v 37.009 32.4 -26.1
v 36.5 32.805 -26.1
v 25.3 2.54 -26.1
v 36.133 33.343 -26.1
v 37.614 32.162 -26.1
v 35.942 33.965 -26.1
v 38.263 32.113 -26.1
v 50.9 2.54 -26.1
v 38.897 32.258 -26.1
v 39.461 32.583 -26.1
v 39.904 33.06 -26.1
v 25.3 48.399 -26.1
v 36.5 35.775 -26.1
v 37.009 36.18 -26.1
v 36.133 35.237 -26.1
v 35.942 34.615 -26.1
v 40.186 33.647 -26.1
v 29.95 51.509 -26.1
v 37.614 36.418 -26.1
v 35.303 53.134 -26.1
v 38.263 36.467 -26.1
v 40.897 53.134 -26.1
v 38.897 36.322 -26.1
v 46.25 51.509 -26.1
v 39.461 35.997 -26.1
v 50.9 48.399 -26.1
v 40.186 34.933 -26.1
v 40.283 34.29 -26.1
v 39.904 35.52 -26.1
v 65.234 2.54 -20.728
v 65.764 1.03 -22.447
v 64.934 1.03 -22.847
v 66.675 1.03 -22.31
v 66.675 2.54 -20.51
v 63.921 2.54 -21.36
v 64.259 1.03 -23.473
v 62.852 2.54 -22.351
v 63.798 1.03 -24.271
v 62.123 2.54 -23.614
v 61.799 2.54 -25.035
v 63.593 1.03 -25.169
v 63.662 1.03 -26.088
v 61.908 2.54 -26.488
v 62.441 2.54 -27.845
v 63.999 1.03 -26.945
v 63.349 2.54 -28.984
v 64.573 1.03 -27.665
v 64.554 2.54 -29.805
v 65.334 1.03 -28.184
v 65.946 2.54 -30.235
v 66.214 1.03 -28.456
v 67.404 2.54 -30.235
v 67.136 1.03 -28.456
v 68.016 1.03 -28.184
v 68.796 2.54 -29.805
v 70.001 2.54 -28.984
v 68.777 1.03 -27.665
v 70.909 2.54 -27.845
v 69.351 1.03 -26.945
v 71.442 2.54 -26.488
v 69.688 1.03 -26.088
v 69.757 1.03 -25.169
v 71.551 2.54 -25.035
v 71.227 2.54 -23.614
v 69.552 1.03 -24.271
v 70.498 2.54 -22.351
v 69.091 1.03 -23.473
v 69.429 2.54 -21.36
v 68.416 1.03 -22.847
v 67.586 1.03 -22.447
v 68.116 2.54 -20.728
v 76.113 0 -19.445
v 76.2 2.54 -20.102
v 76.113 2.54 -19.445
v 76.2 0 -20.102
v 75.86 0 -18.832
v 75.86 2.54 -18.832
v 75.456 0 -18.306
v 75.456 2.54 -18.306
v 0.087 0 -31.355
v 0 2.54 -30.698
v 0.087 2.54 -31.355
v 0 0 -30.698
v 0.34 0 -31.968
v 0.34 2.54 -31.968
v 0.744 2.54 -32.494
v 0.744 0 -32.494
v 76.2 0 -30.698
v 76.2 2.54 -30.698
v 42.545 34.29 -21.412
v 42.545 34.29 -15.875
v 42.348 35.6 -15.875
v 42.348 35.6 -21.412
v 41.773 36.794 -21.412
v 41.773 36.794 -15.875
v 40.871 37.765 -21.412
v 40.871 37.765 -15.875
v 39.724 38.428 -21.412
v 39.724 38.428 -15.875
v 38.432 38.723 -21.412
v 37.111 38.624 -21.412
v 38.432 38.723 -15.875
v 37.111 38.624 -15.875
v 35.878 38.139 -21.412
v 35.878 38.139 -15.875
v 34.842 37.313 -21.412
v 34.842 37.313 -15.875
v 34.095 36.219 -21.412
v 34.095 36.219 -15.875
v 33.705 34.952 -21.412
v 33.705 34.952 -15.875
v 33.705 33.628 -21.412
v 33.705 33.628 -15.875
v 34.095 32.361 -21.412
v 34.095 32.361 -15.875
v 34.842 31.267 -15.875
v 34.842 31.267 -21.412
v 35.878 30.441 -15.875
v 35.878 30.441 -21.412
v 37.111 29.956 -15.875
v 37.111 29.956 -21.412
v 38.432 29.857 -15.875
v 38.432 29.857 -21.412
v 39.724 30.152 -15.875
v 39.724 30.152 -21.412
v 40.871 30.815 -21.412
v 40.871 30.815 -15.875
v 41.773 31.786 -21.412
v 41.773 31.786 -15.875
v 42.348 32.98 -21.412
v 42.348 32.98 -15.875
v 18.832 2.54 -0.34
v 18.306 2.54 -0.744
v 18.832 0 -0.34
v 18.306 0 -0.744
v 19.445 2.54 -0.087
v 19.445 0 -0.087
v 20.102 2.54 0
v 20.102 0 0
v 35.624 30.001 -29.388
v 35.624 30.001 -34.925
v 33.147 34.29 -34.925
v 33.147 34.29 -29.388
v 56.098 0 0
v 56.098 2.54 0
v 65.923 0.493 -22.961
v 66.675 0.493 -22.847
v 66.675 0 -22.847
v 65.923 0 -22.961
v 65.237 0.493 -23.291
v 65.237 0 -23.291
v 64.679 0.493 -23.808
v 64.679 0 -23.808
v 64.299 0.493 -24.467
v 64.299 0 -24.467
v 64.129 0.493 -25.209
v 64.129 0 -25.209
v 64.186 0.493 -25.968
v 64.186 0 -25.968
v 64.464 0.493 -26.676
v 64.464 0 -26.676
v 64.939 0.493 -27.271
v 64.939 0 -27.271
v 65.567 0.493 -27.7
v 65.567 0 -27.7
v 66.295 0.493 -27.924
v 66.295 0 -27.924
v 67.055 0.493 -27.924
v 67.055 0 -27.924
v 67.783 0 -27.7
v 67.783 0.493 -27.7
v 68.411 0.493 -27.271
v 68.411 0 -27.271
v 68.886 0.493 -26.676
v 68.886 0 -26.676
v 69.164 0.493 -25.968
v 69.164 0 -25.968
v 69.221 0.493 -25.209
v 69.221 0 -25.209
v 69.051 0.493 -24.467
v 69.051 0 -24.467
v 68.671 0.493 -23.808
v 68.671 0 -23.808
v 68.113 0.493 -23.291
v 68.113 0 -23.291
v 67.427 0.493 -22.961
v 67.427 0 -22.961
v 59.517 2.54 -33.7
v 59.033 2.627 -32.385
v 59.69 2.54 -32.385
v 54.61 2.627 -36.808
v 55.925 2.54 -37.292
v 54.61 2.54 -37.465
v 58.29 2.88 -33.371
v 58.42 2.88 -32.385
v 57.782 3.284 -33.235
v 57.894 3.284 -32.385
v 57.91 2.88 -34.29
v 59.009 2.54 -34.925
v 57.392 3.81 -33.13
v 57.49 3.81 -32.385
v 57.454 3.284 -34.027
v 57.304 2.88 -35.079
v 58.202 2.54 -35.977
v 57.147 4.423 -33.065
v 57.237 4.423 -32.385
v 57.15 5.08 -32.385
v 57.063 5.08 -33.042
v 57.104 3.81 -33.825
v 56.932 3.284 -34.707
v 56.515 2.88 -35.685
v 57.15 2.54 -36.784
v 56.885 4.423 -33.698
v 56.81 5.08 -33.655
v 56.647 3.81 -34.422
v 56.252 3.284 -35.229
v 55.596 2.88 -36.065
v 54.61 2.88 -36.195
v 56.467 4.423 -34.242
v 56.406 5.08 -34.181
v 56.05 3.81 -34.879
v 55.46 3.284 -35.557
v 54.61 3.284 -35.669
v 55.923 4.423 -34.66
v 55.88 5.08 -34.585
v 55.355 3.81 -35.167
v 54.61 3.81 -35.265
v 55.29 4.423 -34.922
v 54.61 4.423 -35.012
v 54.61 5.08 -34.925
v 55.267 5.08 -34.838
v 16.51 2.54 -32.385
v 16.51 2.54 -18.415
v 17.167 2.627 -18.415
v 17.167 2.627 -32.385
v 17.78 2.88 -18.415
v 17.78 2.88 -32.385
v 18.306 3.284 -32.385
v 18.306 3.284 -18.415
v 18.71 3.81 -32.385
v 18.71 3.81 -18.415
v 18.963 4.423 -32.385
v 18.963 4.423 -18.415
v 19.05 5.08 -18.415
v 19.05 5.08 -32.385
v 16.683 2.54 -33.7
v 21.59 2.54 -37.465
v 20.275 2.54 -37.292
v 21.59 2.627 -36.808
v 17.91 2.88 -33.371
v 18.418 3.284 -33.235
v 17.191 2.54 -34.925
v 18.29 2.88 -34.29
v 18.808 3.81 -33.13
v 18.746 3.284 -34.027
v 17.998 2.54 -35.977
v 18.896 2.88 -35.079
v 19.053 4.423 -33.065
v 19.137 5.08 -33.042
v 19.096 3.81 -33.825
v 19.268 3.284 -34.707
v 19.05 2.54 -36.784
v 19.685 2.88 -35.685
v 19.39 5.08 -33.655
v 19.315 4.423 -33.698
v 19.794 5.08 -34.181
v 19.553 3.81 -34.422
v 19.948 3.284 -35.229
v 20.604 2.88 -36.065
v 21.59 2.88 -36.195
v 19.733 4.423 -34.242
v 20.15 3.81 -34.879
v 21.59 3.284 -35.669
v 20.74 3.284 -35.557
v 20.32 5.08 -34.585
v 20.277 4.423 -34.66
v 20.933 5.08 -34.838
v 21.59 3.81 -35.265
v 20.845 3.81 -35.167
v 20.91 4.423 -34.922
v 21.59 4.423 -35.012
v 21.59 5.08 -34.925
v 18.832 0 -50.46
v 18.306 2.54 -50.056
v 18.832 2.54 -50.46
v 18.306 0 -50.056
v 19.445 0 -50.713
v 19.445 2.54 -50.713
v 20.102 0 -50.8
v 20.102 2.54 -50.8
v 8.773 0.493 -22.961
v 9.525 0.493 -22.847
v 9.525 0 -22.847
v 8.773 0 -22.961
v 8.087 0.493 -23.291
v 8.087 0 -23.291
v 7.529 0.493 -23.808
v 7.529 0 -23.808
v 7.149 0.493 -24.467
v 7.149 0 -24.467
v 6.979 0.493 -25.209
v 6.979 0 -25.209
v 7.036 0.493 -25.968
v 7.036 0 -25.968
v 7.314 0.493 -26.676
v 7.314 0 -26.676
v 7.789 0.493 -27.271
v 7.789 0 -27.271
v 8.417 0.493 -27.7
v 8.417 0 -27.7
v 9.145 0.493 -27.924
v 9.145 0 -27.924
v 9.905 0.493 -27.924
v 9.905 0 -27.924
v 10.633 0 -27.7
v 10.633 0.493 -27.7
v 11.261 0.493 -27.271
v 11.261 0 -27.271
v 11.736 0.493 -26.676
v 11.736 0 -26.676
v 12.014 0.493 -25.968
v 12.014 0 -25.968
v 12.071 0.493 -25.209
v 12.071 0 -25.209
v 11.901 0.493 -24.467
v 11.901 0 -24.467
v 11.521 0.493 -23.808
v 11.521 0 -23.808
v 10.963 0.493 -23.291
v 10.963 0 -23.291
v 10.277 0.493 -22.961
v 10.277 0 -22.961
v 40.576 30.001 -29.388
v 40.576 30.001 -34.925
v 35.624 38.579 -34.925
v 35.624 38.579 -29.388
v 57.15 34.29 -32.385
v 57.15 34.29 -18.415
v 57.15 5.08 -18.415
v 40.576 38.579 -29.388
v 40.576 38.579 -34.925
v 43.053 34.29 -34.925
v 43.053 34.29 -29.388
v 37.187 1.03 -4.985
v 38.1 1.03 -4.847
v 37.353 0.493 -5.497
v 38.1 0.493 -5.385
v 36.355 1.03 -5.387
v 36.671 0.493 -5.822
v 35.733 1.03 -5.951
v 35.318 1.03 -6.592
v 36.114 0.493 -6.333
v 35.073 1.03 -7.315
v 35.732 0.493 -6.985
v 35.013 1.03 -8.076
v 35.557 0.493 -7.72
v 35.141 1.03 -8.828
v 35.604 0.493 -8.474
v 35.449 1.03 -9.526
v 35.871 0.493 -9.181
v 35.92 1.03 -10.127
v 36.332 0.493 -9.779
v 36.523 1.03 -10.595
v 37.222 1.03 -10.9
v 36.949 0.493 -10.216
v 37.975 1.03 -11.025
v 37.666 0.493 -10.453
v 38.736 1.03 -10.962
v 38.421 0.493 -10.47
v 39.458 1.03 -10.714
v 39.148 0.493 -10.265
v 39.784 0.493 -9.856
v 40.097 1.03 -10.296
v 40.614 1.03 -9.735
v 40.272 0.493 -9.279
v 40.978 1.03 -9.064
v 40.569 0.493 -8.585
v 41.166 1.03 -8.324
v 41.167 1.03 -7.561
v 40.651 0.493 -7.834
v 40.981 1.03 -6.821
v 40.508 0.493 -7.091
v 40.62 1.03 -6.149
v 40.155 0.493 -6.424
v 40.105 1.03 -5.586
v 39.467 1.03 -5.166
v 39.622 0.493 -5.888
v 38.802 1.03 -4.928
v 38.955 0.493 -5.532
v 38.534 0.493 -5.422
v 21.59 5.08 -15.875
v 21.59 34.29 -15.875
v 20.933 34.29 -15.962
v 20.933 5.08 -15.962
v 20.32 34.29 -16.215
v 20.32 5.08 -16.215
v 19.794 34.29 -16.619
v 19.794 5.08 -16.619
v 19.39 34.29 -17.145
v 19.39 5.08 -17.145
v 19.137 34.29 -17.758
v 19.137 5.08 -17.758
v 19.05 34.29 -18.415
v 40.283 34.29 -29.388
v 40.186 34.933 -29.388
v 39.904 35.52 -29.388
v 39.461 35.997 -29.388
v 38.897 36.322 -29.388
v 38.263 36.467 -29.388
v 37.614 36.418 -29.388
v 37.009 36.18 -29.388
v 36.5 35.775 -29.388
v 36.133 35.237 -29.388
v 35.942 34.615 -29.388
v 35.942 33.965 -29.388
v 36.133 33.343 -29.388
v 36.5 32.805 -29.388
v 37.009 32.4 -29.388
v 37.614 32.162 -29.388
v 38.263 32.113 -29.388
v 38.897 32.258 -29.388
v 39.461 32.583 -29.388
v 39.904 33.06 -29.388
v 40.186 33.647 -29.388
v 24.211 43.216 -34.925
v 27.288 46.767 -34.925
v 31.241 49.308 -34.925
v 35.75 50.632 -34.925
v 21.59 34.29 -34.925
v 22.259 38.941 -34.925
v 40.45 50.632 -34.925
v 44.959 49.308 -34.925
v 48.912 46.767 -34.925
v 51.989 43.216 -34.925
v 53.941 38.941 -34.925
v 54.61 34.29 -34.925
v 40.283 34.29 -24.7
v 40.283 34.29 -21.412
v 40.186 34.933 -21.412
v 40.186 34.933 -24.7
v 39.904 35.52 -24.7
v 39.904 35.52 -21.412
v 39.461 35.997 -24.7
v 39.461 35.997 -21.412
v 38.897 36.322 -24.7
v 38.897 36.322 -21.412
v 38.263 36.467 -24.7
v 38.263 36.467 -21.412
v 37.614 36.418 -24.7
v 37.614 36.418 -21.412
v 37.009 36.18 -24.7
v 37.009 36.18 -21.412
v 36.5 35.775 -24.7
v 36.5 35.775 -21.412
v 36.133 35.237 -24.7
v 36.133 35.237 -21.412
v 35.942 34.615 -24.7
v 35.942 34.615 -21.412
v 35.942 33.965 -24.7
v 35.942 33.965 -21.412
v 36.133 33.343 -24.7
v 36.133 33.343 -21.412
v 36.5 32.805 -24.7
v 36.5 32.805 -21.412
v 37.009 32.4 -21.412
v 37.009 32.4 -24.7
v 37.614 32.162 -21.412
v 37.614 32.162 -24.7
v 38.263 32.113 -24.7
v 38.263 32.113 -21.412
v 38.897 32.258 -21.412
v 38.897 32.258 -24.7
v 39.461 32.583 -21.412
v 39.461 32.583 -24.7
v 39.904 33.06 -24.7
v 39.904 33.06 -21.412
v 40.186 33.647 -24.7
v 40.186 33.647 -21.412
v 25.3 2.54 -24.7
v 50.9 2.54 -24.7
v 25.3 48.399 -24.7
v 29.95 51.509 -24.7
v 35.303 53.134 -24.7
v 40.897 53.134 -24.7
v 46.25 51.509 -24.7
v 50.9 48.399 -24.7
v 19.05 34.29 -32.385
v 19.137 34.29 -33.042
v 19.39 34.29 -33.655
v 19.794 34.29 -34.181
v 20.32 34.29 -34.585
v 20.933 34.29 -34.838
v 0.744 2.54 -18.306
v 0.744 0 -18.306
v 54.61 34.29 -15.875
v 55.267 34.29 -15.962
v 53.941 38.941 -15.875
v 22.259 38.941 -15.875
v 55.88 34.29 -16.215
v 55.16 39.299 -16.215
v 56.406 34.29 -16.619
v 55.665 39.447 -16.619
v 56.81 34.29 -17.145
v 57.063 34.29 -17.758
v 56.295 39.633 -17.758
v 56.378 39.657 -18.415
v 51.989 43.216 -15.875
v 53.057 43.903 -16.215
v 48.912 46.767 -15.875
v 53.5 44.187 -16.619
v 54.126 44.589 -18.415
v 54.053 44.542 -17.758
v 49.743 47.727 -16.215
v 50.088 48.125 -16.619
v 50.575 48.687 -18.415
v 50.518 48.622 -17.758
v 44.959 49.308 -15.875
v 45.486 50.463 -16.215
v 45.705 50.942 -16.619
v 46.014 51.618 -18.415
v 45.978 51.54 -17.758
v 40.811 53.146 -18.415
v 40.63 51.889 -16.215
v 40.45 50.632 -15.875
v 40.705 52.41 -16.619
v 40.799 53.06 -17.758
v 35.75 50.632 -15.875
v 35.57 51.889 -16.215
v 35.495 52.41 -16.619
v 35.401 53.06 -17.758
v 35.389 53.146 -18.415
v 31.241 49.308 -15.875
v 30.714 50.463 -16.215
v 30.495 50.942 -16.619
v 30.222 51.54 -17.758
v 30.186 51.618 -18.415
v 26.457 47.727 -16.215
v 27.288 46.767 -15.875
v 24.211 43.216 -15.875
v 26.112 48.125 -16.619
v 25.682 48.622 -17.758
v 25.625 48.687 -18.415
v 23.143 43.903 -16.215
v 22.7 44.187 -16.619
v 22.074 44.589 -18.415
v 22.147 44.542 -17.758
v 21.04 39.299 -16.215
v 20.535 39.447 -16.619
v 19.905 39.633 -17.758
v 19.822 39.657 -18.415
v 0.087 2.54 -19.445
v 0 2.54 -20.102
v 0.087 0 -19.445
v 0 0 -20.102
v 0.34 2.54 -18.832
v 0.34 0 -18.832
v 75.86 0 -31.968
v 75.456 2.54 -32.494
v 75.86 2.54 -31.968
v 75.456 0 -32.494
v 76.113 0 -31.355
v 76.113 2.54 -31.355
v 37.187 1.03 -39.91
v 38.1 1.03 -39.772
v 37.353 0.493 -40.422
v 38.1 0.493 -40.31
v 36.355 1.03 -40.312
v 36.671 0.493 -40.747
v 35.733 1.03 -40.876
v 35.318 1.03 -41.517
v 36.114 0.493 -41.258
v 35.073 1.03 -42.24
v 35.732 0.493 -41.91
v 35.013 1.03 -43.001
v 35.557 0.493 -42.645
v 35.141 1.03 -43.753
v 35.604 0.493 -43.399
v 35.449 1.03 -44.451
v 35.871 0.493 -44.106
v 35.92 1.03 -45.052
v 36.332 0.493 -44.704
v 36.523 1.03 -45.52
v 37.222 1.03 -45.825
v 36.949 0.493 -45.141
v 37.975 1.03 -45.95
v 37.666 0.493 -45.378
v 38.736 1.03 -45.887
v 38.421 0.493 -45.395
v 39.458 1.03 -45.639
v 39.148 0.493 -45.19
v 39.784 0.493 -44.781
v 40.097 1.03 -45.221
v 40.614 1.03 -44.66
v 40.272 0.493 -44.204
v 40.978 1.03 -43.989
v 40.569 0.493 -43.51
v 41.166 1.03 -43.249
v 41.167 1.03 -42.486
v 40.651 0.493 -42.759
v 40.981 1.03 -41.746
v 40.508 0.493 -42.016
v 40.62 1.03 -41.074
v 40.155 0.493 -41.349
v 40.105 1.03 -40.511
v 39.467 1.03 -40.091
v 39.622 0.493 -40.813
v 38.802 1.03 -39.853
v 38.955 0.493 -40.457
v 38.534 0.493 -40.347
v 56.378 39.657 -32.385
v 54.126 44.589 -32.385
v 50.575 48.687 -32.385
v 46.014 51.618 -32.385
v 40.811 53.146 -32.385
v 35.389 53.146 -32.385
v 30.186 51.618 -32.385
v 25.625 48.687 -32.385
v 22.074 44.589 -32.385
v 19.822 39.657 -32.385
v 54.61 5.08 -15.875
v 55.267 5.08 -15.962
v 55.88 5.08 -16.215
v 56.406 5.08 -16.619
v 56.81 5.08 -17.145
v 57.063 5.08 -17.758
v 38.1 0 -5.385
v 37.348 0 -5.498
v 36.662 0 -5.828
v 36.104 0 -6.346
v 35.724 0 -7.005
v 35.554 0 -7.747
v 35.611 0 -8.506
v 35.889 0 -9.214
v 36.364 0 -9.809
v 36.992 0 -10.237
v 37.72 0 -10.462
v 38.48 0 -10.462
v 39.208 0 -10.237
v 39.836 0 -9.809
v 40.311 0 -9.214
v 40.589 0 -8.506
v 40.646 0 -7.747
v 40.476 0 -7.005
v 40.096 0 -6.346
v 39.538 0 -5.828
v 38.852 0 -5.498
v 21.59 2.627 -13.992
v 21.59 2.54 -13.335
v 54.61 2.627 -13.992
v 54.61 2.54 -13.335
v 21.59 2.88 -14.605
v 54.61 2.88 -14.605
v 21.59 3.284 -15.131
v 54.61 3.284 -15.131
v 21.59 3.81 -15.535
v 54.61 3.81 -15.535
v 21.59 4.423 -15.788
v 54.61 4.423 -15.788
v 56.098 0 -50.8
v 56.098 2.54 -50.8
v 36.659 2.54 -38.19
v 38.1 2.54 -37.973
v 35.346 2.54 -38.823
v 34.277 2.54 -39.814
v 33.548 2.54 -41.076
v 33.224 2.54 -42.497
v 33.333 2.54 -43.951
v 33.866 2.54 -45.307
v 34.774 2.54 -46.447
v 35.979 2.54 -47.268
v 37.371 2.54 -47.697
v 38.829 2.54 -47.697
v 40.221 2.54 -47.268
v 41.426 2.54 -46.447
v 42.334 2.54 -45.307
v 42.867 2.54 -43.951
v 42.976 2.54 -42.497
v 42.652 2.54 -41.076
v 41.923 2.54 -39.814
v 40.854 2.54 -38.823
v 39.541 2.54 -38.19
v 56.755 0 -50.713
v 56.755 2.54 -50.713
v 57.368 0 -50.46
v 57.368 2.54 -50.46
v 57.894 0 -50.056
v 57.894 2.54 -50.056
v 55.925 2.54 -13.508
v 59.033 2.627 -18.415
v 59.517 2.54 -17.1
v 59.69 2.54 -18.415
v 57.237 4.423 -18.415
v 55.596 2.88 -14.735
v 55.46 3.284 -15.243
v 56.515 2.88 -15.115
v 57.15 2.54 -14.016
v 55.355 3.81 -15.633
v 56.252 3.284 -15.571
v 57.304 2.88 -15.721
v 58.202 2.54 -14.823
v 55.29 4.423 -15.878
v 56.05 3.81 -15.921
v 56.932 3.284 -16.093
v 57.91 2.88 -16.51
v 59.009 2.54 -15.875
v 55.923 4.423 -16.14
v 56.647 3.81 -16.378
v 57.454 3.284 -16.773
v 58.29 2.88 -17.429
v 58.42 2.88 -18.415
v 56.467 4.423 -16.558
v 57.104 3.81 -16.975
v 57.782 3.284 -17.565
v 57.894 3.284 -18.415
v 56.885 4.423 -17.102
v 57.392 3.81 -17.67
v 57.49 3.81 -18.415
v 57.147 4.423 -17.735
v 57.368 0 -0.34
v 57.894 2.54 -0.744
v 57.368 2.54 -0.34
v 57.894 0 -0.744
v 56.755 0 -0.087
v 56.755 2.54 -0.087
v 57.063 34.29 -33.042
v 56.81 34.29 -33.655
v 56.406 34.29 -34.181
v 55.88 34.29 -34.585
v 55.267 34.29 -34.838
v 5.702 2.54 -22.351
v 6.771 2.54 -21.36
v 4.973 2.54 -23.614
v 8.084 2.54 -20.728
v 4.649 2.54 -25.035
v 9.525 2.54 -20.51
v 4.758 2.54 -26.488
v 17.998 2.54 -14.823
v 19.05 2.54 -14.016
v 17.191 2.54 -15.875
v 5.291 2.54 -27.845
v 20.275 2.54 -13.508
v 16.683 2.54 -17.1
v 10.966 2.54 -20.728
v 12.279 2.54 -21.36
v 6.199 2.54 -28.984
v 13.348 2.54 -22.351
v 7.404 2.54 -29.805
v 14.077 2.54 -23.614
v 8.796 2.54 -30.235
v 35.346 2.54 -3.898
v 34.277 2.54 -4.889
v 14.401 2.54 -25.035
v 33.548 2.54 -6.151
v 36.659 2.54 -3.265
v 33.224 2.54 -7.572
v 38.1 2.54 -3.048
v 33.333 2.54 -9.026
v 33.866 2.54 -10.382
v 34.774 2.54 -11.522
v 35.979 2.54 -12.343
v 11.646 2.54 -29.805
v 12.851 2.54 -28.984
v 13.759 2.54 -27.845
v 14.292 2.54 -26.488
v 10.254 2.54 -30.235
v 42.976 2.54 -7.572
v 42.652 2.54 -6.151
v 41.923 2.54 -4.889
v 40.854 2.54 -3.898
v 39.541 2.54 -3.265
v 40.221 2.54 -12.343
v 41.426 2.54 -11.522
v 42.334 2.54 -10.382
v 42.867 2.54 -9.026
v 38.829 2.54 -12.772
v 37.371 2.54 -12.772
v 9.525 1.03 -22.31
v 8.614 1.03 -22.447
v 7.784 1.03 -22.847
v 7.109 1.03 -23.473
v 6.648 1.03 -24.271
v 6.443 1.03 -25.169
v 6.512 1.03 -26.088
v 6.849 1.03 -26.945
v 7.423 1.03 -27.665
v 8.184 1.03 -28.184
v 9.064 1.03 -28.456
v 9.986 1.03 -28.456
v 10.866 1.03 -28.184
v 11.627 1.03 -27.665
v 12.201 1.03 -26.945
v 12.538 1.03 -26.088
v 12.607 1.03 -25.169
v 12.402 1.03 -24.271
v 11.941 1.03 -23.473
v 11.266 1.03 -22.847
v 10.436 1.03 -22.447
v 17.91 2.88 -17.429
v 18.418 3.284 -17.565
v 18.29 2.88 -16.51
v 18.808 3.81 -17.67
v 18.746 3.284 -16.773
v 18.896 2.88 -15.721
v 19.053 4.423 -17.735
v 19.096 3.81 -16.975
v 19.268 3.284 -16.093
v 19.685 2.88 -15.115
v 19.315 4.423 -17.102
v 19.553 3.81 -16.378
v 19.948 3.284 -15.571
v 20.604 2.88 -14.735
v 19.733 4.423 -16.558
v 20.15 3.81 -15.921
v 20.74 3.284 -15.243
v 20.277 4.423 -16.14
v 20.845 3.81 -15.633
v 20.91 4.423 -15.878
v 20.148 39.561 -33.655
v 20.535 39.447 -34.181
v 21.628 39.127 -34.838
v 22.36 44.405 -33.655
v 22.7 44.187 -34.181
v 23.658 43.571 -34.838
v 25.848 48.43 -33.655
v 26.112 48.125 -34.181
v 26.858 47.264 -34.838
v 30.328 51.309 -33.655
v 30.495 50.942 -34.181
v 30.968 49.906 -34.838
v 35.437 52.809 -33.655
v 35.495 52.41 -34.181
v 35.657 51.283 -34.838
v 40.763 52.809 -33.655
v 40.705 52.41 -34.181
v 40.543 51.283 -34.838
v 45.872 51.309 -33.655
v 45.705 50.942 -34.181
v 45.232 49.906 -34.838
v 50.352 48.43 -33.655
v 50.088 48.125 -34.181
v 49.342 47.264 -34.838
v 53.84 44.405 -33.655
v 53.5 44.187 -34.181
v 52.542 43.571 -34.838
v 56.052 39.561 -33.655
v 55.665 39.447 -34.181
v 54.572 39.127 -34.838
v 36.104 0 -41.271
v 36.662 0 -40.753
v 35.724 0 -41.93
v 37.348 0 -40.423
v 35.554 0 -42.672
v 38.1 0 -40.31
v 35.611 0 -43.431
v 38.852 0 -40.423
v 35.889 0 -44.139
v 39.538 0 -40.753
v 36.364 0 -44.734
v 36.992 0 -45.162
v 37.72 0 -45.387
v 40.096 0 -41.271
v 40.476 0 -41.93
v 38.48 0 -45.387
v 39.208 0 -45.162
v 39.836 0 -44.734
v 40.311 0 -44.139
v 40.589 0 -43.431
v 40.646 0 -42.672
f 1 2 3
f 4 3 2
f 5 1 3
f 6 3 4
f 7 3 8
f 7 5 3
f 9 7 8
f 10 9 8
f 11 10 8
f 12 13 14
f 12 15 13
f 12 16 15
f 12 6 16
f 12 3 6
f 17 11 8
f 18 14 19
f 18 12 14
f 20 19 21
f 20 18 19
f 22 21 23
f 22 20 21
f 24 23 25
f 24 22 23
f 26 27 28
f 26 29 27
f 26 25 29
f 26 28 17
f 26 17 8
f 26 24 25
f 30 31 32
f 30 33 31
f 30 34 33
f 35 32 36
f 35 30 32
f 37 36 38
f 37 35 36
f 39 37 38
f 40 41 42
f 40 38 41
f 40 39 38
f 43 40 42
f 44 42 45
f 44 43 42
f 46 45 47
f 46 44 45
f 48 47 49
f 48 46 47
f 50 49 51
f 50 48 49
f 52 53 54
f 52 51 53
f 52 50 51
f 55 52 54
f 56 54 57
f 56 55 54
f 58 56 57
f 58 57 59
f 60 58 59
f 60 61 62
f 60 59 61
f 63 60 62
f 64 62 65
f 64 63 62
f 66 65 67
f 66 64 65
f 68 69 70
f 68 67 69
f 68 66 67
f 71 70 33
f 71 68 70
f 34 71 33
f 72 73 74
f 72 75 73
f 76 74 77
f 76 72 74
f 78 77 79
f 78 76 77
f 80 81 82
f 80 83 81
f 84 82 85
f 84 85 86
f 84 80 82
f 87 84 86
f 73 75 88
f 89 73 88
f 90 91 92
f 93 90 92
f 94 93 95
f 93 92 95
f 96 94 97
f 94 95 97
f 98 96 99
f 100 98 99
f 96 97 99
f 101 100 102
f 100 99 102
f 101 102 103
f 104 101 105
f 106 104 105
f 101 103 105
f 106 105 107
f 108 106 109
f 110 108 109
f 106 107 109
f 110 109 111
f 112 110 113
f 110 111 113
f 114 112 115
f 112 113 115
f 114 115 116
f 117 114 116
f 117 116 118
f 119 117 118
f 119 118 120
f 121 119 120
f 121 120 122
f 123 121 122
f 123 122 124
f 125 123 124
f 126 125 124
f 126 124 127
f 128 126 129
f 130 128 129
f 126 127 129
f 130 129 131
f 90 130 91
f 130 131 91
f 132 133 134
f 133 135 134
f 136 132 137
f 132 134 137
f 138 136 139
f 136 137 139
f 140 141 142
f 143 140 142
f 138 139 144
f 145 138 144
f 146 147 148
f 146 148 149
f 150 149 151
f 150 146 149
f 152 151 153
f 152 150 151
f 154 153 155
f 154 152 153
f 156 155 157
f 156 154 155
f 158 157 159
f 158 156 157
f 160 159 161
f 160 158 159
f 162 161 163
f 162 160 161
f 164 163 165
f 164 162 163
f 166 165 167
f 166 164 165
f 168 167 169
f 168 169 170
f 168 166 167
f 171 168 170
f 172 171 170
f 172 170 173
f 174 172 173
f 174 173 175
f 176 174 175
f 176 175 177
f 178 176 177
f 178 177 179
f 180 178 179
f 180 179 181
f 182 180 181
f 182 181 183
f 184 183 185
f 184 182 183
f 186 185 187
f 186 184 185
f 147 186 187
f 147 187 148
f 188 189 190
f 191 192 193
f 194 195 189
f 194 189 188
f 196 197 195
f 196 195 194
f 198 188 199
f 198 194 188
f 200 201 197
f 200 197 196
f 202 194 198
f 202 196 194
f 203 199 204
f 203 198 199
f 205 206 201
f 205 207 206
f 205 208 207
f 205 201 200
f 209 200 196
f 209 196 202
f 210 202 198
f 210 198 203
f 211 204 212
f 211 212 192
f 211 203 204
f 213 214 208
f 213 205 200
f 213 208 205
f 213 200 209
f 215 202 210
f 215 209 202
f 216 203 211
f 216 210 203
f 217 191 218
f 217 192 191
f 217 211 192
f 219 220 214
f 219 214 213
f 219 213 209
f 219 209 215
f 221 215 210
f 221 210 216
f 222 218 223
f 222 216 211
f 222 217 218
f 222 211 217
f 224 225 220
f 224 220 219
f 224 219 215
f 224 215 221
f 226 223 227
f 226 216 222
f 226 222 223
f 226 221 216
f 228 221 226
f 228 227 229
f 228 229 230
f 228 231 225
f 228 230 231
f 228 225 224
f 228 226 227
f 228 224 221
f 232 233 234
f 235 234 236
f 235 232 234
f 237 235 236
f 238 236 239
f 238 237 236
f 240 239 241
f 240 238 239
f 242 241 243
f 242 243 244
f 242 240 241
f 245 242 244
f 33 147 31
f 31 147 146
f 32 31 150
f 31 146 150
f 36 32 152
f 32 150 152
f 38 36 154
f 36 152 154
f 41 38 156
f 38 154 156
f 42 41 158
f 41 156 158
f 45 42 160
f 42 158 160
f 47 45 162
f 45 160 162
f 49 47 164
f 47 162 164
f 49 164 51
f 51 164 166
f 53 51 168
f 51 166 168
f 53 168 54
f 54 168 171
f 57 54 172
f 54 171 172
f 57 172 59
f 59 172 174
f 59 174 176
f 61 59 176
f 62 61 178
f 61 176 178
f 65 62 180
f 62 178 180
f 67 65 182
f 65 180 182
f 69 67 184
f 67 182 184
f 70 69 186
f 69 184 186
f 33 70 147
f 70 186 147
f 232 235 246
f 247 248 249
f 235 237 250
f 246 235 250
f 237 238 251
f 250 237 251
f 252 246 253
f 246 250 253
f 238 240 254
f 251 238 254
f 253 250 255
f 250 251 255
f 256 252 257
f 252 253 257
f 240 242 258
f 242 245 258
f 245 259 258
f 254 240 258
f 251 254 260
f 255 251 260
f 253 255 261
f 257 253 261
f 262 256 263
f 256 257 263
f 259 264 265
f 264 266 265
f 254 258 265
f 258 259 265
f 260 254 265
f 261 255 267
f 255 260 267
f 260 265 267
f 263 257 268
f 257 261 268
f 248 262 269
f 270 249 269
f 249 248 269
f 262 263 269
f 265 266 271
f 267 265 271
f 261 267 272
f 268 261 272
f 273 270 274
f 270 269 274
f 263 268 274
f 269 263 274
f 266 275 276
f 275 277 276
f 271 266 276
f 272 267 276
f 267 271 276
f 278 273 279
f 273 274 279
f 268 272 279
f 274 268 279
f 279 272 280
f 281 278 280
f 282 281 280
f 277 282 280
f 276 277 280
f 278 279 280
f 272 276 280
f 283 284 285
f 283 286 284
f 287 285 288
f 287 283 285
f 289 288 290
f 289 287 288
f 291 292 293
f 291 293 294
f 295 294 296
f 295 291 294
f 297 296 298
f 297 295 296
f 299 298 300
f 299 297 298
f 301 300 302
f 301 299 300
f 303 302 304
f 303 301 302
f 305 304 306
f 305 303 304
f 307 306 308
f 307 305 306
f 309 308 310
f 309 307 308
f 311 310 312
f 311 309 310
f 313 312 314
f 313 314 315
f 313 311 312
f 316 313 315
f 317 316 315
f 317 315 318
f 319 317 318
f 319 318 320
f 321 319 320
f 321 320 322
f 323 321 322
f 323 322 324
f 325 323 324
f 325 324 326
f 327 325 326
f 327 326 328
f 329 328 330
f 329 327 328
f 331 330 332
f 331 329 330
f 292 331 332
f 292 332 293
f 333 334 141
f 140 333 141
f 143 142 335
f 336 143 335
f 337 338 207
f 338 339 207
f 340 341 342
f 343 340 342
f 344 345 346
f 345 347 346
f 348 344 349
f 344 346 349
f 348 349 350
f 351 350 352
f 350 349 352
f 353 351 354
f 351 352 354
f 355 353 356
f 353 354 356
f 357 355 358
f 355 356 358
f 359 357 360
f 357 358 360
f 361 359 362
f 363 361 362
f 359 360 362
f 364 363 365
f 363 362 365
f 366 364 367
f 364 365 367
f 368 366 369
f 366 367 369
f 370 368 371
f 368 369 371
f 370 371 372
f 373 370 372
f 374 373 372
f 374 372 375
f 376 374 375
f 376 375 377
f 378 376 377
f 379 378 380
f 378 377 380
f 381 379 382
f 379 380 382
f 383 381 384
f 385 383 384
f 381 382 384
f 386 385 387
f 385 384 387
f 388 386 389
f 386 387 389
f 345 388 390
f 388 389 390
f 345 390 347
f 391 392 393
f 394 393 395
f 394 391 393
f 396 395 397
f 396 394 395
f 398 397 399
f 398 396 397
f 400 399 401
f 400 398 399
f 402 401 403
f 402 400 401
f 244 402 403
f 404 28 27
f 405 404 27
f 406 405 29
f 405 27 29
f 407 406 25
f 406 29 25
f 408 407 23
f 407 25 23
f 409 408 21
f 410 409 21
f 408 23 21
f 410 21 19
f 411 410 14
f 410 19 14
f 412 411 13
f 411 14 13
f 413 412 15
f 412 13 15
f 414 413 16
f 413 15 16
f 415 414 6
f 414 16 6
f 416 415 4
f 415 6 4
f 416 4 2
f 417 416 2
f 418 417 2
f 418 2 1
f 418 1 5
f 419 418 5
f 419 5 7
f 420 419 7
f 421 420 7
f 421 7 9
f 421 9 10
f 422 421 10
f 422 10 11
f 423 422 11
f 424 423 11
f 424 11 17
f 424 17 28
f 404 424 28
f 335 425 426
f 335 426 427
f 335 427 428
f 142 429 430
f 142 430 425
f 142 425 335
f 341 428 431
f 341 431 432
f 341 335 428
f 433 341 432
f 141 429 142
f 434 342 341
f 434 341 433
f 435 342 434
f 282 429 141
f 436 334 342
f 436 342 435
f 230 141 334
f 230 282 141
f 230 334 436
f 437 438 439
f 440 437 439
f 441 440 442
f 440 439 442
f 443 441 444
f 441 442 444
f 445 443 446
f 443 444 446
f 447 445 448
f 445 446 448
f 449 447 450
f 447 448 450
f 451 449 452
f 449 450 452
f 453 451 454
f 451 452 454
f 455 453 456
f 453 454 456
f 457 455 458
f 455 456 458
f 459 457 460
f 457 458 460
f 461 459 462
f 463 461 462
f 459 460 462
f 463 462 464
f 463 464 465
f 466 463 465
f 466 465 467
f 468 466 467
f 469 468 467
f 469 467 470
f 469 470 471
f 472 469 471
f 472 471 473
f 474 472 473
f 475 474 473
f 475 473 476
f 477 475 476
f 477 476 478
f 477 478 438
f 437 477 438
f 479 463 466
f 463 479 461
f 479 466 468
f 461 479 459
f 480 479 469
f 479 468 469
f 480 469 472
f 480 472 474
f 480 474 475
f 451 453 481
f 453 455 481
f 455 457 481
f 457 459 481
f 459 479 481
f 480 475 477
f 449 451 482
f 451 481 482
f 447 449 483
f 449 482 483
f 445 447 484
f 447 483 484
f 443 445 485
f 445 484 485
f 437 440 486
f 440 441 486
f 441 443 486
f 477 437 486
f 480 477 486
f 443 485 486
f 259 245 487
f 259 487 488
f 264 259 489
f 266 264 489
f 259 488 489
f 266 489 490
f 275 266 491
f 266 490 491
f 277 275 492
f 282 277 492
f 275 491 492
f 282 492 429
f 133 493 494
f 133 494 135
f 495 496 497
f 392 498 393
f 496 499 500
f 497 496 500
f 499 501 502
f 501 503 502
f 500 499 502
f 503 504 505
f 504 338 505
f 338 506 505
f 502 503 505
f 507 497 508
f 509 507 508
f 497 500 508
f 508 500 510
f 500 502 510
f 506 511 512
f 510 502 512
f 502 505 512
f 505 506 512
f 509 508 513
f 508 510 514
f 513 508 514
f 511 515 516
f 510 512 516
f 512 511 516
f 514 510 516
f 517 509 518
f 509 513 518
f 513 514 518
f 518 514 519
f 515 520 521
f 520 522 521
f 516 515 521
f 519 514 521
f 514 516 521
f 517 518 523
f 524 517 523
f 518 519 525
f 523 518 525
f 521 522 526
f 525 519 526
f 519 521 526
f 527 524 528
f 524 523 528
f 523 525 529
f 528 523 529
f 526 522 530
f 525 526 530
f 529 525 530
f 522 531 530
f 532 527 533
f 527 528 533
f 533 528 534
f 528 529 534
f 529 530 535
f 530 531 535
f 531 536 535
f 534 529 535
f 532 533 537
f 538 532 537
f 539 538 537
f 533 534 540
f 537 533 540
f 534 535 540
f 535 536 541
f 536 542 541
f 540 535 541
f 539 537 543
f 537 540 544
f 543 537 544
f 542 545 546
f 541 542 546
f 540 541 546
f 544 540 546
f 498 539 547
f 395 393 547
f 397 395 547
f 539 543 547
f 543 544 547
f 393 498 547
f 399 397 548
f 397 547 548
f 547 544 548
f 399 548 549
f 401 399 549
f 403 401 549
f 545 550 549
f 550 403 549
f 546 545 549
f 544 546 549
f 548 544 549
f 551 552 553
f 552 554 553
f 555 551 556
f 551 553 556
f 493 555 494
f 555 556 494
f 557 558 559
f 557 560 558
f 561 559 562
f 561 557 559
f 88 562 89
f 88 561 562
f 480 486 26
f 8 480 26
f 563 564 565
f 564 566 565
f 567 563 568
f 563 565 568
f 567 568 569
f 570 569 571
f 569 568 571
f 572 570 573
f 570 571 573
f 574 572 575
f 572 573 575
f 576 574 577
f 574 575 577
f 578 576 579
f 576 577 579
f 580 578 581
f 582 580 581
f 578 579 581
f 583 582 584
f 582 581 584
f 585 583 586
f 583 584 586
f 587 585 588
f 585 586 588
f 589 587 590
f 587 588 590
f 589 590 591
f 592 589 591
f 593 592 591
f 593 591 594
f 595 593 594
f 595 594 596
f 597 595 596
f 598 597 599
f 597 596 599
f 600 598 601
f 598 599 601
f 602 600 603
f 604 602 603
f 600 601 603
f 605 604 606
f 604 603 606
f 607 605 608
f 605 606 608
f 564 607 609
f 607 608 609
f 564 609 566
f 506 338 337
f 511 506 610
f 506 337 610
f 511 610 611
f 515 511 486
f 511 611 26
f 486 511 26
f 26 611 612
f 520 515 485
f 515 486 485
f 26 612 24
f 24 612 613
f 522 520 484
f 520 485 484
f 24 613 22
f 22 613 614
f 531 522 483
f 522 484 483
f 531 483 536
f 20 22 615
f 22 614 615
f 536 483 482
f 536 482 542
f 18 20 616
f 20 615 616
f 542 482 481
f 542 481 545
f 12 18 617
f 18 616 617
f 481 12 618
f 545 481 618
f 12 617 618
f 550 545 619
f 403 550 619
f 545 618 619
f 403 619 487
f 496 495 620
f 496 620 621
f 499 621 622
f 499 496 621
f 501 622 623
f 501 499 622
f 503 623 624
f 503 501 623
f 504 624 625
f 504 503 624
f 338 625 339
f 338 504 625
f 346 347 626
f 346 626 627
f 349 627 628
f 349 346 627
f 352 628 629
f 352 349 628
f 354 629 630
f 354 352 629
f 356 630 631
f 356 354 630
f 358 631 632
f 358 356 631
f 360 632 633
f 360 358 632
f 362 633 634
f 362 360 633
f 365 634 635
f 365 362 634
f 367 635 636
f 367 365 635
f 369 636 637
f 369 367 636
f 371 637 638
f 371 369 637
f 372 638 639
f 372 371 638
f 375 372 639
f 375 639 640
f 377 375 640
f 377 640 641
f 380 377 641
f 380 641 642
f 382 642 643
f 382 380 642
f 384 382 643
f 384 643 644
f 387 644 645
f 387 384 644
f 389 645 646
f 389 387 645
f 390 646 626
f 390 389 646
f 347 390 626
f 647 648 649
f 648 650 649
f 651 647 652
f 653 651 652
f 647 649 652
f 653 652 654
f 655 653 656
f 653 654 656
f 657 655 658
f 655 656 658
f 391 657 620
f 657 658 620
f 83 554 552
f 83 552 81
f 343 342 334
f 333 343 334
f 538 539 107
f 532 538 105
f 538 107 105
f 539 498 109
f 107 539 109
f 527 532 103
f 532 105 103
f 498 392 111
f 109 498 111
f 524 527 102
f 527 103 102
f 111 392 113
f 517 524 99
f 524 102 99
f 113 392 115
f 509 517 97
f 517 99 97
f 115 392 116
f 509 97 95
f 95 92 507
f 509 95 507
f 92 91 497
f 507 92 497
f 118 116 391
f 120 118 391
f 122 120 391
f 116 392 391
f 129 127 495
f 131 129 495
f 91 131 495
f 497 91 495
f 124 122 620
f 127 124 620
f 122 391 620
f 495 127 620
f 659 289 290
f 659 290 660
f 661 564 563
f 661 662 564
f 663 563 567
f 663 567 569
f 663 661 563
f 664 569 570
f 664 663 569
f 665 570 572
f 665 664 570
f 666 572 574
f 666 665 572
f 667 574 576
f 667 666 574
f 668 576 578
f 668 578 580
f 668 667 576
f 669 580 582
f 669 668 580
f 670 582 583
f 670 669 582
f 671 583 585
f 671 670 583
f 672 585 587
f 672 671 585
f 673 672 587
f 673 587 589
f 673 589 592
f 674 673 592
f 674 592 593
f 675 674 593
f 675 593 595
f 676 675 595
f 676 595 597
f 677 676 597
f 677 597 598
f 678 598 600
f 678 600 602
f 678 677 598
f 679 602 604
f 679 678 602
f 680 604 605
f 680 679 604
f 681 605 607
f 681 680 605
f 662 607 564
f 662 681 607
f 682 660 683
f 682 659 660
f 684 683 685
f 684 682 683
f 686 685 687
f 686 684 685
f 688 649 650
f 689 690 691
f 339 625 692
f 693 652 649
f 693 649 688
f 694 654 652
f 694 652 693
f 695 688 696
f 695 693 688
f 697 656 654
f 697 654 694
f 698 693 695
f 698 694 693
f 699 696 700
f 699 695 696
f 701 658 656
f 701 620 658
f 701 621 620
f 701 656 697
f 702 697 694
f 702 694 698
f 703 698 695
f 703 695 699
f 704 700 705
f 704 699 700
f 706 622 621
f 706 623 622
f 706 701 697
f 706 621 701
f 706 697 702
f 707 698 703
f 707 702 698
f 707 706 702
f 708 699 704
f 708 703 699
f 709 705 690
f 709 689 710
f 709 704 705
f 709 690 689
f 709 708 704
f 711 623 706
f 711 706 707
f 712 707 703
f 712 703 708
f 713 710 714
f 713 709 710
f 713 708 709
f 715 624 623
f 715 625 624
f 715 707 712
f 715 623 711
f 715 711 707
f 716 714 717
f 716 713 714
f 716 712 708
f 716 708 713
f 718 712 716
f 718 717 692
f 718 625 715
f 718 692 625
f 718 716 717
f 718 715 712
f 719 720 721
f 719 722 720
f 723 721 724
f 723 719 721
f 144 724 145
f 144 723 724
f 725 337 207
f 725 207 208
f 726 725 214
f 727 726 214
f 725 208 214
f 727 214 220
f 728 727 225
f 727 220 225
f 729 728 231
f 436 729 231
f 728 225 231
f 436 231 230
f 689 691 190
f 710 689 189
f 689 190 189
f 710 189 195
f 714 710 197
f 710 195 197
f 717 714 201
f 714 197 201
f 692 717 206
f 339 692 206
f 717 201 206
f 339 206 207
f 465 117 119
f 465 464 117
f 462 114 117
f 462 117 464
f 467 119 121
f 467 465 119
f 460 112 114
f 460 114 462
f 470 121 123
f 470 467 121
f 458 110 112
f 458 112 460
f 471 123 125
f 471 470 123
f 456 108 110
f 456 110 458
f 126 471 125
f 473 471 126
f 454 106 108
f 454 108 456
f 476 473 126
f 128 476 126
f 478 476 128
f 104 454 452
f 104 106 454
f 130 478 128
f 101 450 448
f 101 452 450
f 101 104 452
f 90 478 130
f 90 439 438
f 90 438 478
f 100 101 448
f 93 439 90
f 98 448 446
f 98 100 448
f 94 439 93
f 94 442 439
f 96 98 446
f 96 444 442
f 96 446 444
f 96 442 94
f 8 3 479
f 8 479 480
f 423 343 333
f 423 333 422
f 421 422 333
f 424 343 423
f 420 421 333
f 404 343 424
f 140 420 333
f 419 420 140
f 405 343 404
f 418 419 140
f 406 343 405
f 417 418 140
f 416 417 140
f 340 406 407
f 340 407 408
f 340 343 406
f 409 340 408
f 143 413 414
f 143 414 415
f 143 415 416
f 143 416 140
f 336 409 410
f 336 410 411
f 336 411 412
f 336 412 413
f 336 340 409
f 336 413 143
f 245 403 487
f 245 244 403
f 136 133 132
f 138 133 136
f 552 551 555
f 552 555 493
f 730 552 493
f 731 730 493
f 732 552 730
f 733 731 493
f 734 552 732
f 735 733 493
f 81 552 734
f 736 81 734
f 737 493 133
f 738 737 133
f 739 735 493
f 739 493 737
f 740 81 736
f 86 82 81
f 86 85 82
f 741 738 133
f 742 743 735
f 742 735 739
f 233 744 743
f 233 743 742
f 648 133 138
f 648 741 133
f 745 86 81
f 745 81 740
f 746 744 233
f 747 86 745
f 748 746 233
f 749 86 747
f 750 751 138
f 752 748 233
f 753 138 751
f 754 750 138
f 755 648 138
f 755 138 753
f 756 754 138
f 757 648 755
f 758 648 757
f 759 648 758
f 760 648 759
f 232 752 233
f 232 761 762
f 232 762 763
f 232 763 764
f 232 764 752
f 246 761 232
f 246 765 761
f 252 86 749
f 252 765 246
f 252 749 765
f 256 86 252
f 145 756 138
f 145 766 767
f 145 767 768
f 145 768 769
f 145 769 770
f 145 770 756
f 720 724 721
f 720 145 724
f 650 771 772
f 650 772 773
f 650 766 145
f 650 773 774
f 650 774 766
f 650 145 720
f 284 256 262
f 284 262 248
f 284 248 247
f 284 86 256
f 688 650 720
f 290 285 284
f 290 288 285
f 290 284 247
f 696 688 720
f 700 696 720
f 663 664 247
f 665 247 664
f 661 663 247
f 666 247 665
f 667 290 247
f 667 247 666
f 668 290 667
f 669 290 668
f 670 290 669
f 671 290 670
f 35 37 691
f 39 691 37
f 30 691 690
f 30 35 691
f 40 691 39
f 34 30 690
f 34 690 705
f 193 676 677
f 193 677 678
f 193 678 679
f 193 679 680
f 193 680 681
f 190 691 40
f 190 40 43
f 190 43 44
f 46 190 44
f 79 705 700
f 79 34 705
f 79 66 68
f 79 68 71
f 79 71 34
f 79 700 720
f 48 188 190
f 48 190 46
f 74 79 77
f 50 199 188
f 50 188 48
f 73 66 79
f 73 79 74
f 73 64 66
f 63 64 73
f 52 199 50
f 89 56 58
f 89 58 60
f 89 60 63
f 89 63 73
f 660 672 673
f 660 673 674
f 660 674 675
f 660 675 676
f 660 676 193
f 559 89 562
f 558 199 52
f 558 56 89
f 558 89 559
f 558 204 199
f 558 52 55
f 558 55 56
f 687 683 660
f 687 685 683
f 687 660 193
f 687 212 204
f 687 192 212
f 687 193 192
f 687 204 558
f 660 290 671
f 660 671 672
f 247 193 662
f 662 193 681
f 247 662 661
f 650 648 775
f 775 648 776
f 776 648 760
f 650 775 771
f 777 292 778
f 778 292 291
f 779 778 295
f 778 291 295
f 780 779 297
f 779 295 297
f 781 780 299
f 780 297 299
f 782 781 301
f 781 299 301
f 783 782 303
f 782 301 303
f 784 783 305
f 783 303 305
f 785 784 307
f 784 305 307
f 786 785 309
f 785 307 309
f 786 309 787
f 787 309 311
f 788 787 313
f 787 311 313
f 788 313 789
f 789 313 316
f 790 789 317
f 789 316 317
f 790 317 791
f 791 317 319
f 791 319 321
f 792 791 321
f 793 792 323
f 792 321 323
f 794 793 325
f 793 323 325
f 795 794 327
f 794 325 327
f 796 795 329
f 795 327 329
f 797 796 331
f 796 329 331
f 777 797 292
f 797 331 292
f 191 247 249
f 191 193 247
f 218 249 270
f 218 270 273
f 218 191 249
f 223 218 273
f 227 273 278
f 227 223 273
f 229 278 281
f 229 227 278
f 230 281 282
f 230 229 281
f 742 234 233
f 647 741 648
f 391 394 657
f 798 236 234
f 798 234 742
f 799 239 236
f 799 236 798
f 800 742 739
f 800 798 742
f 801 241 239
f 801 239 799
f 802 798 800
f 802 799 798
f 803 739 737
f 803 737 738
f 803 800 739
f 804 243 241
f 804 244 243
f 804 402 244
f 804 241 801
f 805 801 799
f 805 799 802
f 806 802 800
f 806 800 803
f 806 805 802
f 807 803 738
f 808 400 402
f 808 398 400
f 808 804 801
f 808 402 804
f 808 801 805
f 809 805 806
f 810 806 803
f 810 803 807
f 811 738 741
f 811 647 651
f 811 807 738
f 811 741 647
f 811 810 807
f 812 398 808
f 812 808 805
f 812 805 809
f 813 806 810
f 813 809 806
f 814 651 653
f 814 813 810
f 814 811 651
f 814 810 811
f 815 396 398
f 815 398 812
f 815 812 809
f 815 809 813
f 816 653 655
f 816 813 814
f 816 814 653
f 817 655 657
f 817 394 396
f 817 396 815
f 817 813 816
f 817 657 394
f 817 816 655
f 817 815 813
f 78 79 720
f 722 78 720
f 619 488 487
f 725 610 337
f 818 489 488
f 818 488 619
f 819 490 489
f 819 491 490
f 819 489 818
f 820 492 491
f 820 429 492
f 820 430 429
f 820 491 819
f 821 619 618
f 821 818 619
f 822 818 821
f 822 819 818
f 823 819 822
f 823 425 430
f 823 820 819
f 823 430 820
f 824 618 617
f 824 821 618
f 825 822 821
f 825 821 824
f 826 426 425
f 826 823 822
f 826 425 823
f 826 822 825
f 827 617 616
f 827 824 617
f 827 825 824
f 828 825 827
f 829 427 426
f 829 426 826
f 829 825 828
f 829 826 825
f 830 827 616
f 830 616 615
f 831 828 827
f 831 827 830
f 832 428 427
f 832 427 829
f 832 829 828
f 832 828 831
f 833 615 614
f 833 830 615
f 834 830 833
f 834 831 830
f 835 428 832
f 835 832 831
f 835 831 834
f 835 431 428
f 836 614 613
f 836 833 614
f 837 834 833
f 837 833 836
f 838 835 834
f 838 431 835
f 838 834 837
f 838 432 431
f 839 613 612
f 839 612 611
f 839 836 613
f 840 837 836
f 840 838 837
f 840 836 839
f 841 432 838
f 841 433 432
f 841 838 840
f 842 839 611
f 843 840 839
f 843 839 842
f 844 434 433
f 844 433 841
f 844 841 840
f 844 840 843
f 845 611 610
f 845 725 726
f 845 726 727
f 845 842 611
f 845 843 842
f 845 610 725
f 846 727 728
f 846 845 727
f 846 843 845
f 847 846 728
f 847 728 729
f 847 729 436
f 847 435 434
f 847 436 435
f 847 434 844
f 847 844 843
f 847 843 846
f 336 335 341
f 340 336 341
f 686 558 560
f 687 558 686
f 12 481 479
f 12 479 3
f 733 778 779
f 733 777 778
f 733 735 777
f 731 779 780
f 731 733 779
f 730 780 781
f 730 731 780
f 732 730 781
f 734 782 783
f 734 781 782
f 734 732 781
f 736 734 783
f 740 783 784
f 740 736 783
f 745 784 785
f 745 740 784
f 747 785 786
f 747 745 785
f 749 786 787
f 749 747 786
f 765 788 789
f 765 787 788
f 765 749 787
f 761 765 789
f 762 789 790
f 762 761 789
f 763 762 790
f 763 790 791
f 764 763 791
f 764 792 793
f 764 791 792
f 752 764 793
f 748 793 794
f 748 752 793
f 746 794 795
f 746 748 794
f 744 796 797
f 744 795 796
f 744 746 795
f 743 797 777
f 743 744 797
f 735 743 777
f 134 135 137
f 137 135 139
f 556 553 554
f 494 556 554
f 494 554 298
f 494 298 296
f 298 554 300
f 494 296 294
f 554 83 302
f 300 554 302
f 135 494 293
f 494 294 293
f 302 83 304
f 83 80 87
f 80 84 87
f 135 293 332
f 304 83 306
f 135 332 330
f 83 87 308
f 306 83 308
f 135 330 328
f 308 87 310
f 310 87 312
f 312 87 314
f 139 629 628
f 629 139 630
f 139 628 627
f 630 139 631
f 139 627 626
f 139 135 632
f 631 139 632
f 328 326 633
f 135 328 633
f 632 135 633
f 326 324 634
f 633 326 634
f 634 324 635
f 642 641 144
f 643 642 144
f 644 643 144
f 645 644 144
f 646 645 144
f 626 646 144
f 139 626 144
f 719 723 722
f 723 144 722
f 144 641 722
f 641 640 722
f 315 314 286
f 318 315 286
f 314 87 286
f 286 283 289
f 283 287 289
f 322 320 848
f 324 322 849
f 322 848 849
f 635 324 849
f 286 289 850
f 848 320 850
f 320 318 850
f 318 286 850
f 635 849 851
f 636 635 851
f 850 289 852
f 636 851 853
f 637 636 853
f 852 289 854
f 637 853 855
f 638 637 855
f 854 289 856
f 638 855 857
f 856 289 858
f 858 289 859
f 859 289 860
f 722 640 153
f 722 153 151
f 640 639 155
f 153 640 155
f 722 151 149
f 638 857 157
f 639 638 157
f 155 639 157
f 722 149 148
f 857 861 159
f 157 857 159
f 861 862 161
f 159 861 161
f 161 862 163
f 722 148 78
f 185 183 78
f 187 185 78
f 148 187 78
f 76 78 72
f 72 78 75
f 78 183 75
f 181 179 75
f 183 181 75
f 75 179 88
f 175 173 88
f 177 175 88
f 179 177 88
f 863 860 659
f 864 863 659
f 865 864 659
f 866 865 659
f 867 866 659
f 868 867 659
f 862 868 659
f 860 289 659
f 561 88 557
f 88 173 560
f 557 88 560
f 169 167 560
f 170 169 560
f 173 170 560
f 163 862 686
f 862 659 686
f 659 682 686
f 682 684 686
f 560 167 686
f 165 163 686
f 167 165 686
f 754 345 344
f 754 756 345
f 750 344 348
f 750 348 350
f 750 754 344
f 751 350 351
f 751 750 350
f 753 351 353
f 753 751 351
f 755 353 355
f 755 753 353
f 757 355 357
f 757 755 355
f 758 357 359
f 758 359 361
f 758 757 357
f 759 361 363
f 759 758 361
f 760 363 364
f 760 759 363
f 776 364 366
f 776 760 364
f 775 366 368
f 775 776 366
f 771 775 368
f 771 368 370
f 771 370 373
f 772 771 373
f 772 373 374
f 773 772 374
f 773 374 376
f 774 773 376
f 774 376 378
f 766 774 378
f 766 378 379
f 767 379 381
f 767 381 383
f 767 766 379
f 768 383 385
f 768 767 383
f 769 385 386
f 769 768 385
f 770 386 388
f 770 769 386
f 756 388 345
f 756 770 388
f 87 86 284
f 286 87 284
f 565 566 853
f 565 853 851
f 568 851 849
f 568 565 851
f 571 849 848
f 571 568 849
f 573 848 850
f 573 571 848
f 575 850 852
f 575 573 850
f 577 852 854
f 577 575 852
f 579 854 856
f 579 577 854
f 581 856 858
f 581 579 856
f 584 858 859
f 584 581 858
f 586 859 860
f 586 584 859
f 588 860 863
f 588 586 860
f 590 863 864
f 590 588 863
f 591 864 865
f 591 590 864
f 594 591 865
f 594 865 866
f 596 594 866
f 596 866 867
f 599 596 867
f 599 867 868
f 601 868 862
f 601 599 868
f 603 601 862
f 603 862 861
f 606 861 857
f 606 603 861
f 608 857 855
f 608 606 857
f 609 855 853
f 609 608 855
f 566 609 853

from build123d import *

# Parameters (mm, degrees)
MAIN_BASE_DIM_W                            = 76.2
MAIN_BASE_DIM_H                            = 50.8
MAIN_BASE_DEPTH                            = 2.54
LINKAGE_HOLDER_DIM_W                       = 38.1
LINKAGE_HOLDER_DIM_H                       = 19.05
LINKAGE_HOLDER_DEPTH                       = 50.8
LINKAGE_SLOT_DIM_W                         = 25.6
LINKAGE_SLOT_DIM_H                         = 1.4
LINKAGE_SLOT_DEPTH                         = 50.8
F_75IN_FILLET_R                            = 19.05
BOLT_HOLE_REACH                            = 101.355
BOLT_HOLE_DIM_R                            = 2.1828
BOLT_HEAD_DIM_R                            = 4.445
BOLT_HEAD_DEPTH                            = 5.5372
NUT_SLOT_DEPTH                             = 5.5372
CSK_FOR_10_FLAT_HEAD_MACHINE_SCREW_2_COUNT = 2
CSK_FOR_10_FLAT_HEAD_MACHINE_SCREW_2_PITCH = 33.488349187
CSK_FOR_10_FLAT_HEAD_MACHINE_SCREW_3_COUNT = 2
CSK_FOR_10_FLAT_HEAD_MACHINE_SCREW_3_PITCH = 57.15
CSK_FOR_10_FLAT_HEAD_MACHINE_SCREW_4_COUNT = 2
CSK_FOR_10_FLAT_HEAD_MACHINE_SCREW_4_PITCH = 33.488349187
CORNER_CUT_DEPTH                           = 2.54
F_1IN_FILLET_R                             = 2.54


with BuildPart() as part:
    # Main_Base_Dim → Main_Base (new body)
    with BuildSketch(Plane(origin=(0, 0, 0), x_dir=(1, 0, 0), z_dir=(0, 1, 0))):
        with Locations((38.1, 25.4)):
            Rectangle(MAIN_BASE_DIM_W, MAIN_BASE_DIM_H)
    extrude(amount=MAIN_BASE_DEPTH)

    # Linkage_Holder_Dim → Linkage_Holder (add)
    with BuildSketch(Plane(origin=(0, 2.54, 0), x_dir=(1, 0, 0), z_dir=(0, 1, 0))):
        with Locations((38.1, 25.4)):
            Rectangle(LINKAGE_HOLDER_DIM_W, LINKAGE_HOLDER_DIM_H)
    extrude(amount=LINKAGE_HOLDER_DEPTH)

    # Linkage_Slot_Dim → Linkage_Slot (cut)
    with BuildSketch(Plane(origin=(0, 53.34, 0), x_dir=(1, 0, 0), z_dir=(0, 1, 0))):
        with Locations((38.1, 25.4)):
            Rectangle(LINKAGE_SLOT_DIM_W, LINKAGE_SLOT_DIM_H)
    extrude(amount=-LINKAGE_SLOT_DEPTH, mode=Mode.SUBTRACT)

    # .75in_Fillet
    # the kernel refuses this fillet: 19.05 mm, written as the material it takes off along each edge
    with BuildSketch(Plane(origin=(57.15, 53.34, -82.55), x_dir=(0, -1, 0), z_dir=(0, 0, 1)), Plane(origin=(19.05, 53.34, 31.75), x_dir=(0, -1, 0), z_dir=(0, 0, -1))) as f_75in_fillet_piece_1:
        with BuildLine():
            CenterArc((F_75IN_FILLET_R, -F_75IN_FILLET_R), F_75IN_FILLET_R, 90, 90)
            Line((0, -F_75IN_FILLET_R), (0, 0))
            Line((0, 0), (F_75IN_FILLET_R, 0))
        make_face()
    extrude(amount=114.3, mode=Mode.SUBTRACT)

    # Bolt_Hole: up to this face of the body (flat: up to its plane)
    bolt_hole_end = Plane(part.part.faces().sort_by_distance((38.1, 26.089428348, -34.925))[0])
    # Bolt_Hole_Dim → Bolt_Hole (cut, up to the picked face)
    with BuildSketch(Plane.XY.offset(-15.875), mode=Mode.PRIVATE) as bolt_hole_sk1:
        with Locations((38.1, 34.29)):
            Circle(BOLT_HOLE_DIM_R)
    bolt_hole_tool1 = split(extrude(bolt_hole_sk1.sketch, amount=-BOLT_HOLE_REACH, mode=Mode.PRIVATE), bisect_by=bolt_hole_end, keep=Keep.BOTH, mode=Mode.PRIVATE)
    add(bolt_hole_tool1.solids().sort_by(Axis((38.1, 34.29, -15.875), (0, 0, -1)))[0], mode=Mode.SUBTRACT)

    # Bolt_Head_Dim → Bolt_Head (cut)
    with BuildSketch(Plane.XY.offset(-15.875)):
        with Locations((38.1, 34.29)):
            Circle(BOLT_HEAD_DIM_R)
    extrude(amount=-BOLT_HEAD_DEPTH, mode=Mode.SUBTRACT)

    # Nut_Slot_Dim → Nut_Slot (cut)
    with BuildSketch(Plane(origin=(0, 0, -34.925), x_dir=(-1, 0, 0), z_dir=(0, 0, -1))):
        Polygon((-35.6235, 38.579423825), (-40.5765, 38.579423825), (-43.053, 34.29), (-40.5765, 30.000576175), (-35.6235, 30.000576175), (-33.147, 34.29), align=None)
    extrude(amount=-NUT_SLOT_DEPTH, mode=Mode.SUBTRACT)

    # Sketch9 → CSK for #10 Flat Head Machine Screw (100)1 (revolve, cut)
    with BuildSketch(Plane(origin=(9.525, 2.54, -25.4), x_dir=(0, 0, 1), z_dir=(1, 0, 0))):
        Polygon((0, 0), (0, 2.54), (2.5527, 2.54), (2.5527, 1.960808018), (4.8895, 0), align=None)
    csk_for_10_flat_head_machine_screw_100 = revolve(axis=Axis((9.525, 8.89, -25.4), (0, -1, 0)), mode=Mode.SUBTRACT)

    # CSK for _10 Flat Head Machine Screw  2: CSK for #10 Flat Head Machine Screw (100)1 ×2
    with Locations(*[Vector(0.8532818336519591, 0, -0.5214500094539748) * (i * CSK_FOR_10_FLAT_HEAD_MACHINE_SCREW_2_PITCH) for i in range(1, CSK_FOR_10_FLAT_HEAD_MACHINE_SCREW_2_COUNT)]):
        add(csk_for_10_flat_head_machine_screw_100, mode=Mode.SUBTRACT)

    # CSK for _10 Flat Head Machine Screw  3: CSK for #10 Flat Head Machine Screw (100)1 ×2
    with Locations(*[(i * CSK_FOR_10_FLAT_HEAD_MACHINE_SCREW_3_PITCH, 0, 0) for i in range(1, CSK_FOR_10_FLAT_HEAD_MACHINE_SCREW_3_COUNT)]):
        add(csk_for_10_flat_head_machine_screw_100, mode=Mode.SUBTRACT)

    # CSK for _10 Flat Head Machine Screw  4: CSK for #10 Flat Head Machine Screw (100)1 ×2
    with Locations(*[Vector(0.853281833651959, 0, 0.521450009453975) * (i * CSK_FOR_10_FLAT_HEAD_MACHINE_SCREW_4_PITCH) for i in range(1, CSK_FOR_10_FLAT_HEAD_MACHINE_SCREW_4_COUNT)]):
        add(csk_for_10_flat_head_machine_screw_100, mode=Mode.SUBTRACT)

    # Screw_Hole cone 1 section (through the dimple's axis) → Screw_Hole (revolve, cut)
    with BuildSketch(Plane(origin=(9.525, 2.54, -25.4), x_dir=(0, 0, 1), z_dir=(1, 0, 0))):
        Polygon((0, 0), (4.6, 0), (0, 4.6), align=None)
    revolve(axis=Axis((9.525, 2.54, -25.4), (0, -1, 0)), mode=Mode.SUBTRACT)

    # Screw_Hole cone 2 section (through the dimple's axis) → Screw_Hole cone 2 (revolve, cut)
    with BuildSketch(Plane(origin=(38.1, 2.54, -42.8625), x_dir=(0, 0, 1), z_dir=(1, 0, 0))):
        Polygon((0, 0), (4.6, 0), (0, 4.6), align=None)
    revolve(axis=Axis((38.1, 2.54, -42.8625), (0, -1, 0)), mode=Mode.SUBTRACT)

    # Screw_Hole cone 3 section (through the dimple's axis) → Screw_Hole cone 3 (revolve, cut)
    with BuildSketch(Plane(origin=(66.675, 2.54, -25.4), x_dir=(0, 0, 1), z_dir=(1, 0, 0))):
        Polygon((0, 0), (4.6, 0), (0, 4.6), align=None)
    revolve(axis=Axis((66.675, 2.54, -25.4), (0, -1, 0)), mode=Mode.SUBTRACT)

    # Screw_Hole cone 4 section (through the dimple's axis) → Screw_Hole cone 4 (revolve, cut)
    with BuildSketch(Plane(origin=(38.1, 2.54, -7.9375), x_dir=(0, 0, 1), z_dir=(1, 0, 0))):
        Polygon((0, 0), (4.6, 0), (0, 4.6), align=None)
    revolve(axis=Axis((38.1, 2.54, -7.9375), (0, -1, 0)), mode=Mode.SUBTRACT)

    # Corner_Cut_Dim → Corner_Cut (cut)
    with BuildSketch(Plane(origin=(0, 2.54, 0), x_dir=(1, 0, 0), z_dir=(0, 1, 0))):
        Polygon((0, 0), (0, 19.05), (19.05, 0), align=None)
        Polygon((76.2, 0), (76.2, 19.05), (57.15, 0), align=None)
        Polygon((76.2, 50.8), (76.2, 31.75), (57.15, 50.8), align=None)
        Polygon((0, 31.75), (19.05, 50.8), (0, 50.8), align=None)
    extrude(amount=-CORNER_CUT_DEPTH, mode=Mode.SUBTRACT)

    # .1in_Fillet
    f_1in_fillet_edges = [part.edges().sort_by_distance(p)[0] for p in [
        (19.05, 2.54, -25.4),
        (19.05, 1.27, -50.8),
        (0, 1.27, -31.75),
        (38.1, 2.54, -15.875),
        (76.2, 1.27, -31.75),
        (57.15, 1.27, -50.8),
        (57.15, 2.54, -25.4),
        (76.2, 1.27, -19.05),
        (57.15, 1.27, 0),
        (38.1, 2.54, -34.925),
        (0, 1.27, -19.05),
        (19.05, 1.27, 0),
        (19.05, 18.415, -34.925),
        (57.15, 18.415, -34.925),
        (38.1, 53.34, -34.925),
        (38.1, 53.34, -34.925),
        (57.15, 18.415, -15.875),
        (19.05, 18.415, -15.875),
        (38.1, 53.34, -15.875),
        (38.1, 53.34, -15.875),
    ]]
    fillet(f_1in_fillet_edges, radius=F_1IN_FILLET_R)


solid = part.part
